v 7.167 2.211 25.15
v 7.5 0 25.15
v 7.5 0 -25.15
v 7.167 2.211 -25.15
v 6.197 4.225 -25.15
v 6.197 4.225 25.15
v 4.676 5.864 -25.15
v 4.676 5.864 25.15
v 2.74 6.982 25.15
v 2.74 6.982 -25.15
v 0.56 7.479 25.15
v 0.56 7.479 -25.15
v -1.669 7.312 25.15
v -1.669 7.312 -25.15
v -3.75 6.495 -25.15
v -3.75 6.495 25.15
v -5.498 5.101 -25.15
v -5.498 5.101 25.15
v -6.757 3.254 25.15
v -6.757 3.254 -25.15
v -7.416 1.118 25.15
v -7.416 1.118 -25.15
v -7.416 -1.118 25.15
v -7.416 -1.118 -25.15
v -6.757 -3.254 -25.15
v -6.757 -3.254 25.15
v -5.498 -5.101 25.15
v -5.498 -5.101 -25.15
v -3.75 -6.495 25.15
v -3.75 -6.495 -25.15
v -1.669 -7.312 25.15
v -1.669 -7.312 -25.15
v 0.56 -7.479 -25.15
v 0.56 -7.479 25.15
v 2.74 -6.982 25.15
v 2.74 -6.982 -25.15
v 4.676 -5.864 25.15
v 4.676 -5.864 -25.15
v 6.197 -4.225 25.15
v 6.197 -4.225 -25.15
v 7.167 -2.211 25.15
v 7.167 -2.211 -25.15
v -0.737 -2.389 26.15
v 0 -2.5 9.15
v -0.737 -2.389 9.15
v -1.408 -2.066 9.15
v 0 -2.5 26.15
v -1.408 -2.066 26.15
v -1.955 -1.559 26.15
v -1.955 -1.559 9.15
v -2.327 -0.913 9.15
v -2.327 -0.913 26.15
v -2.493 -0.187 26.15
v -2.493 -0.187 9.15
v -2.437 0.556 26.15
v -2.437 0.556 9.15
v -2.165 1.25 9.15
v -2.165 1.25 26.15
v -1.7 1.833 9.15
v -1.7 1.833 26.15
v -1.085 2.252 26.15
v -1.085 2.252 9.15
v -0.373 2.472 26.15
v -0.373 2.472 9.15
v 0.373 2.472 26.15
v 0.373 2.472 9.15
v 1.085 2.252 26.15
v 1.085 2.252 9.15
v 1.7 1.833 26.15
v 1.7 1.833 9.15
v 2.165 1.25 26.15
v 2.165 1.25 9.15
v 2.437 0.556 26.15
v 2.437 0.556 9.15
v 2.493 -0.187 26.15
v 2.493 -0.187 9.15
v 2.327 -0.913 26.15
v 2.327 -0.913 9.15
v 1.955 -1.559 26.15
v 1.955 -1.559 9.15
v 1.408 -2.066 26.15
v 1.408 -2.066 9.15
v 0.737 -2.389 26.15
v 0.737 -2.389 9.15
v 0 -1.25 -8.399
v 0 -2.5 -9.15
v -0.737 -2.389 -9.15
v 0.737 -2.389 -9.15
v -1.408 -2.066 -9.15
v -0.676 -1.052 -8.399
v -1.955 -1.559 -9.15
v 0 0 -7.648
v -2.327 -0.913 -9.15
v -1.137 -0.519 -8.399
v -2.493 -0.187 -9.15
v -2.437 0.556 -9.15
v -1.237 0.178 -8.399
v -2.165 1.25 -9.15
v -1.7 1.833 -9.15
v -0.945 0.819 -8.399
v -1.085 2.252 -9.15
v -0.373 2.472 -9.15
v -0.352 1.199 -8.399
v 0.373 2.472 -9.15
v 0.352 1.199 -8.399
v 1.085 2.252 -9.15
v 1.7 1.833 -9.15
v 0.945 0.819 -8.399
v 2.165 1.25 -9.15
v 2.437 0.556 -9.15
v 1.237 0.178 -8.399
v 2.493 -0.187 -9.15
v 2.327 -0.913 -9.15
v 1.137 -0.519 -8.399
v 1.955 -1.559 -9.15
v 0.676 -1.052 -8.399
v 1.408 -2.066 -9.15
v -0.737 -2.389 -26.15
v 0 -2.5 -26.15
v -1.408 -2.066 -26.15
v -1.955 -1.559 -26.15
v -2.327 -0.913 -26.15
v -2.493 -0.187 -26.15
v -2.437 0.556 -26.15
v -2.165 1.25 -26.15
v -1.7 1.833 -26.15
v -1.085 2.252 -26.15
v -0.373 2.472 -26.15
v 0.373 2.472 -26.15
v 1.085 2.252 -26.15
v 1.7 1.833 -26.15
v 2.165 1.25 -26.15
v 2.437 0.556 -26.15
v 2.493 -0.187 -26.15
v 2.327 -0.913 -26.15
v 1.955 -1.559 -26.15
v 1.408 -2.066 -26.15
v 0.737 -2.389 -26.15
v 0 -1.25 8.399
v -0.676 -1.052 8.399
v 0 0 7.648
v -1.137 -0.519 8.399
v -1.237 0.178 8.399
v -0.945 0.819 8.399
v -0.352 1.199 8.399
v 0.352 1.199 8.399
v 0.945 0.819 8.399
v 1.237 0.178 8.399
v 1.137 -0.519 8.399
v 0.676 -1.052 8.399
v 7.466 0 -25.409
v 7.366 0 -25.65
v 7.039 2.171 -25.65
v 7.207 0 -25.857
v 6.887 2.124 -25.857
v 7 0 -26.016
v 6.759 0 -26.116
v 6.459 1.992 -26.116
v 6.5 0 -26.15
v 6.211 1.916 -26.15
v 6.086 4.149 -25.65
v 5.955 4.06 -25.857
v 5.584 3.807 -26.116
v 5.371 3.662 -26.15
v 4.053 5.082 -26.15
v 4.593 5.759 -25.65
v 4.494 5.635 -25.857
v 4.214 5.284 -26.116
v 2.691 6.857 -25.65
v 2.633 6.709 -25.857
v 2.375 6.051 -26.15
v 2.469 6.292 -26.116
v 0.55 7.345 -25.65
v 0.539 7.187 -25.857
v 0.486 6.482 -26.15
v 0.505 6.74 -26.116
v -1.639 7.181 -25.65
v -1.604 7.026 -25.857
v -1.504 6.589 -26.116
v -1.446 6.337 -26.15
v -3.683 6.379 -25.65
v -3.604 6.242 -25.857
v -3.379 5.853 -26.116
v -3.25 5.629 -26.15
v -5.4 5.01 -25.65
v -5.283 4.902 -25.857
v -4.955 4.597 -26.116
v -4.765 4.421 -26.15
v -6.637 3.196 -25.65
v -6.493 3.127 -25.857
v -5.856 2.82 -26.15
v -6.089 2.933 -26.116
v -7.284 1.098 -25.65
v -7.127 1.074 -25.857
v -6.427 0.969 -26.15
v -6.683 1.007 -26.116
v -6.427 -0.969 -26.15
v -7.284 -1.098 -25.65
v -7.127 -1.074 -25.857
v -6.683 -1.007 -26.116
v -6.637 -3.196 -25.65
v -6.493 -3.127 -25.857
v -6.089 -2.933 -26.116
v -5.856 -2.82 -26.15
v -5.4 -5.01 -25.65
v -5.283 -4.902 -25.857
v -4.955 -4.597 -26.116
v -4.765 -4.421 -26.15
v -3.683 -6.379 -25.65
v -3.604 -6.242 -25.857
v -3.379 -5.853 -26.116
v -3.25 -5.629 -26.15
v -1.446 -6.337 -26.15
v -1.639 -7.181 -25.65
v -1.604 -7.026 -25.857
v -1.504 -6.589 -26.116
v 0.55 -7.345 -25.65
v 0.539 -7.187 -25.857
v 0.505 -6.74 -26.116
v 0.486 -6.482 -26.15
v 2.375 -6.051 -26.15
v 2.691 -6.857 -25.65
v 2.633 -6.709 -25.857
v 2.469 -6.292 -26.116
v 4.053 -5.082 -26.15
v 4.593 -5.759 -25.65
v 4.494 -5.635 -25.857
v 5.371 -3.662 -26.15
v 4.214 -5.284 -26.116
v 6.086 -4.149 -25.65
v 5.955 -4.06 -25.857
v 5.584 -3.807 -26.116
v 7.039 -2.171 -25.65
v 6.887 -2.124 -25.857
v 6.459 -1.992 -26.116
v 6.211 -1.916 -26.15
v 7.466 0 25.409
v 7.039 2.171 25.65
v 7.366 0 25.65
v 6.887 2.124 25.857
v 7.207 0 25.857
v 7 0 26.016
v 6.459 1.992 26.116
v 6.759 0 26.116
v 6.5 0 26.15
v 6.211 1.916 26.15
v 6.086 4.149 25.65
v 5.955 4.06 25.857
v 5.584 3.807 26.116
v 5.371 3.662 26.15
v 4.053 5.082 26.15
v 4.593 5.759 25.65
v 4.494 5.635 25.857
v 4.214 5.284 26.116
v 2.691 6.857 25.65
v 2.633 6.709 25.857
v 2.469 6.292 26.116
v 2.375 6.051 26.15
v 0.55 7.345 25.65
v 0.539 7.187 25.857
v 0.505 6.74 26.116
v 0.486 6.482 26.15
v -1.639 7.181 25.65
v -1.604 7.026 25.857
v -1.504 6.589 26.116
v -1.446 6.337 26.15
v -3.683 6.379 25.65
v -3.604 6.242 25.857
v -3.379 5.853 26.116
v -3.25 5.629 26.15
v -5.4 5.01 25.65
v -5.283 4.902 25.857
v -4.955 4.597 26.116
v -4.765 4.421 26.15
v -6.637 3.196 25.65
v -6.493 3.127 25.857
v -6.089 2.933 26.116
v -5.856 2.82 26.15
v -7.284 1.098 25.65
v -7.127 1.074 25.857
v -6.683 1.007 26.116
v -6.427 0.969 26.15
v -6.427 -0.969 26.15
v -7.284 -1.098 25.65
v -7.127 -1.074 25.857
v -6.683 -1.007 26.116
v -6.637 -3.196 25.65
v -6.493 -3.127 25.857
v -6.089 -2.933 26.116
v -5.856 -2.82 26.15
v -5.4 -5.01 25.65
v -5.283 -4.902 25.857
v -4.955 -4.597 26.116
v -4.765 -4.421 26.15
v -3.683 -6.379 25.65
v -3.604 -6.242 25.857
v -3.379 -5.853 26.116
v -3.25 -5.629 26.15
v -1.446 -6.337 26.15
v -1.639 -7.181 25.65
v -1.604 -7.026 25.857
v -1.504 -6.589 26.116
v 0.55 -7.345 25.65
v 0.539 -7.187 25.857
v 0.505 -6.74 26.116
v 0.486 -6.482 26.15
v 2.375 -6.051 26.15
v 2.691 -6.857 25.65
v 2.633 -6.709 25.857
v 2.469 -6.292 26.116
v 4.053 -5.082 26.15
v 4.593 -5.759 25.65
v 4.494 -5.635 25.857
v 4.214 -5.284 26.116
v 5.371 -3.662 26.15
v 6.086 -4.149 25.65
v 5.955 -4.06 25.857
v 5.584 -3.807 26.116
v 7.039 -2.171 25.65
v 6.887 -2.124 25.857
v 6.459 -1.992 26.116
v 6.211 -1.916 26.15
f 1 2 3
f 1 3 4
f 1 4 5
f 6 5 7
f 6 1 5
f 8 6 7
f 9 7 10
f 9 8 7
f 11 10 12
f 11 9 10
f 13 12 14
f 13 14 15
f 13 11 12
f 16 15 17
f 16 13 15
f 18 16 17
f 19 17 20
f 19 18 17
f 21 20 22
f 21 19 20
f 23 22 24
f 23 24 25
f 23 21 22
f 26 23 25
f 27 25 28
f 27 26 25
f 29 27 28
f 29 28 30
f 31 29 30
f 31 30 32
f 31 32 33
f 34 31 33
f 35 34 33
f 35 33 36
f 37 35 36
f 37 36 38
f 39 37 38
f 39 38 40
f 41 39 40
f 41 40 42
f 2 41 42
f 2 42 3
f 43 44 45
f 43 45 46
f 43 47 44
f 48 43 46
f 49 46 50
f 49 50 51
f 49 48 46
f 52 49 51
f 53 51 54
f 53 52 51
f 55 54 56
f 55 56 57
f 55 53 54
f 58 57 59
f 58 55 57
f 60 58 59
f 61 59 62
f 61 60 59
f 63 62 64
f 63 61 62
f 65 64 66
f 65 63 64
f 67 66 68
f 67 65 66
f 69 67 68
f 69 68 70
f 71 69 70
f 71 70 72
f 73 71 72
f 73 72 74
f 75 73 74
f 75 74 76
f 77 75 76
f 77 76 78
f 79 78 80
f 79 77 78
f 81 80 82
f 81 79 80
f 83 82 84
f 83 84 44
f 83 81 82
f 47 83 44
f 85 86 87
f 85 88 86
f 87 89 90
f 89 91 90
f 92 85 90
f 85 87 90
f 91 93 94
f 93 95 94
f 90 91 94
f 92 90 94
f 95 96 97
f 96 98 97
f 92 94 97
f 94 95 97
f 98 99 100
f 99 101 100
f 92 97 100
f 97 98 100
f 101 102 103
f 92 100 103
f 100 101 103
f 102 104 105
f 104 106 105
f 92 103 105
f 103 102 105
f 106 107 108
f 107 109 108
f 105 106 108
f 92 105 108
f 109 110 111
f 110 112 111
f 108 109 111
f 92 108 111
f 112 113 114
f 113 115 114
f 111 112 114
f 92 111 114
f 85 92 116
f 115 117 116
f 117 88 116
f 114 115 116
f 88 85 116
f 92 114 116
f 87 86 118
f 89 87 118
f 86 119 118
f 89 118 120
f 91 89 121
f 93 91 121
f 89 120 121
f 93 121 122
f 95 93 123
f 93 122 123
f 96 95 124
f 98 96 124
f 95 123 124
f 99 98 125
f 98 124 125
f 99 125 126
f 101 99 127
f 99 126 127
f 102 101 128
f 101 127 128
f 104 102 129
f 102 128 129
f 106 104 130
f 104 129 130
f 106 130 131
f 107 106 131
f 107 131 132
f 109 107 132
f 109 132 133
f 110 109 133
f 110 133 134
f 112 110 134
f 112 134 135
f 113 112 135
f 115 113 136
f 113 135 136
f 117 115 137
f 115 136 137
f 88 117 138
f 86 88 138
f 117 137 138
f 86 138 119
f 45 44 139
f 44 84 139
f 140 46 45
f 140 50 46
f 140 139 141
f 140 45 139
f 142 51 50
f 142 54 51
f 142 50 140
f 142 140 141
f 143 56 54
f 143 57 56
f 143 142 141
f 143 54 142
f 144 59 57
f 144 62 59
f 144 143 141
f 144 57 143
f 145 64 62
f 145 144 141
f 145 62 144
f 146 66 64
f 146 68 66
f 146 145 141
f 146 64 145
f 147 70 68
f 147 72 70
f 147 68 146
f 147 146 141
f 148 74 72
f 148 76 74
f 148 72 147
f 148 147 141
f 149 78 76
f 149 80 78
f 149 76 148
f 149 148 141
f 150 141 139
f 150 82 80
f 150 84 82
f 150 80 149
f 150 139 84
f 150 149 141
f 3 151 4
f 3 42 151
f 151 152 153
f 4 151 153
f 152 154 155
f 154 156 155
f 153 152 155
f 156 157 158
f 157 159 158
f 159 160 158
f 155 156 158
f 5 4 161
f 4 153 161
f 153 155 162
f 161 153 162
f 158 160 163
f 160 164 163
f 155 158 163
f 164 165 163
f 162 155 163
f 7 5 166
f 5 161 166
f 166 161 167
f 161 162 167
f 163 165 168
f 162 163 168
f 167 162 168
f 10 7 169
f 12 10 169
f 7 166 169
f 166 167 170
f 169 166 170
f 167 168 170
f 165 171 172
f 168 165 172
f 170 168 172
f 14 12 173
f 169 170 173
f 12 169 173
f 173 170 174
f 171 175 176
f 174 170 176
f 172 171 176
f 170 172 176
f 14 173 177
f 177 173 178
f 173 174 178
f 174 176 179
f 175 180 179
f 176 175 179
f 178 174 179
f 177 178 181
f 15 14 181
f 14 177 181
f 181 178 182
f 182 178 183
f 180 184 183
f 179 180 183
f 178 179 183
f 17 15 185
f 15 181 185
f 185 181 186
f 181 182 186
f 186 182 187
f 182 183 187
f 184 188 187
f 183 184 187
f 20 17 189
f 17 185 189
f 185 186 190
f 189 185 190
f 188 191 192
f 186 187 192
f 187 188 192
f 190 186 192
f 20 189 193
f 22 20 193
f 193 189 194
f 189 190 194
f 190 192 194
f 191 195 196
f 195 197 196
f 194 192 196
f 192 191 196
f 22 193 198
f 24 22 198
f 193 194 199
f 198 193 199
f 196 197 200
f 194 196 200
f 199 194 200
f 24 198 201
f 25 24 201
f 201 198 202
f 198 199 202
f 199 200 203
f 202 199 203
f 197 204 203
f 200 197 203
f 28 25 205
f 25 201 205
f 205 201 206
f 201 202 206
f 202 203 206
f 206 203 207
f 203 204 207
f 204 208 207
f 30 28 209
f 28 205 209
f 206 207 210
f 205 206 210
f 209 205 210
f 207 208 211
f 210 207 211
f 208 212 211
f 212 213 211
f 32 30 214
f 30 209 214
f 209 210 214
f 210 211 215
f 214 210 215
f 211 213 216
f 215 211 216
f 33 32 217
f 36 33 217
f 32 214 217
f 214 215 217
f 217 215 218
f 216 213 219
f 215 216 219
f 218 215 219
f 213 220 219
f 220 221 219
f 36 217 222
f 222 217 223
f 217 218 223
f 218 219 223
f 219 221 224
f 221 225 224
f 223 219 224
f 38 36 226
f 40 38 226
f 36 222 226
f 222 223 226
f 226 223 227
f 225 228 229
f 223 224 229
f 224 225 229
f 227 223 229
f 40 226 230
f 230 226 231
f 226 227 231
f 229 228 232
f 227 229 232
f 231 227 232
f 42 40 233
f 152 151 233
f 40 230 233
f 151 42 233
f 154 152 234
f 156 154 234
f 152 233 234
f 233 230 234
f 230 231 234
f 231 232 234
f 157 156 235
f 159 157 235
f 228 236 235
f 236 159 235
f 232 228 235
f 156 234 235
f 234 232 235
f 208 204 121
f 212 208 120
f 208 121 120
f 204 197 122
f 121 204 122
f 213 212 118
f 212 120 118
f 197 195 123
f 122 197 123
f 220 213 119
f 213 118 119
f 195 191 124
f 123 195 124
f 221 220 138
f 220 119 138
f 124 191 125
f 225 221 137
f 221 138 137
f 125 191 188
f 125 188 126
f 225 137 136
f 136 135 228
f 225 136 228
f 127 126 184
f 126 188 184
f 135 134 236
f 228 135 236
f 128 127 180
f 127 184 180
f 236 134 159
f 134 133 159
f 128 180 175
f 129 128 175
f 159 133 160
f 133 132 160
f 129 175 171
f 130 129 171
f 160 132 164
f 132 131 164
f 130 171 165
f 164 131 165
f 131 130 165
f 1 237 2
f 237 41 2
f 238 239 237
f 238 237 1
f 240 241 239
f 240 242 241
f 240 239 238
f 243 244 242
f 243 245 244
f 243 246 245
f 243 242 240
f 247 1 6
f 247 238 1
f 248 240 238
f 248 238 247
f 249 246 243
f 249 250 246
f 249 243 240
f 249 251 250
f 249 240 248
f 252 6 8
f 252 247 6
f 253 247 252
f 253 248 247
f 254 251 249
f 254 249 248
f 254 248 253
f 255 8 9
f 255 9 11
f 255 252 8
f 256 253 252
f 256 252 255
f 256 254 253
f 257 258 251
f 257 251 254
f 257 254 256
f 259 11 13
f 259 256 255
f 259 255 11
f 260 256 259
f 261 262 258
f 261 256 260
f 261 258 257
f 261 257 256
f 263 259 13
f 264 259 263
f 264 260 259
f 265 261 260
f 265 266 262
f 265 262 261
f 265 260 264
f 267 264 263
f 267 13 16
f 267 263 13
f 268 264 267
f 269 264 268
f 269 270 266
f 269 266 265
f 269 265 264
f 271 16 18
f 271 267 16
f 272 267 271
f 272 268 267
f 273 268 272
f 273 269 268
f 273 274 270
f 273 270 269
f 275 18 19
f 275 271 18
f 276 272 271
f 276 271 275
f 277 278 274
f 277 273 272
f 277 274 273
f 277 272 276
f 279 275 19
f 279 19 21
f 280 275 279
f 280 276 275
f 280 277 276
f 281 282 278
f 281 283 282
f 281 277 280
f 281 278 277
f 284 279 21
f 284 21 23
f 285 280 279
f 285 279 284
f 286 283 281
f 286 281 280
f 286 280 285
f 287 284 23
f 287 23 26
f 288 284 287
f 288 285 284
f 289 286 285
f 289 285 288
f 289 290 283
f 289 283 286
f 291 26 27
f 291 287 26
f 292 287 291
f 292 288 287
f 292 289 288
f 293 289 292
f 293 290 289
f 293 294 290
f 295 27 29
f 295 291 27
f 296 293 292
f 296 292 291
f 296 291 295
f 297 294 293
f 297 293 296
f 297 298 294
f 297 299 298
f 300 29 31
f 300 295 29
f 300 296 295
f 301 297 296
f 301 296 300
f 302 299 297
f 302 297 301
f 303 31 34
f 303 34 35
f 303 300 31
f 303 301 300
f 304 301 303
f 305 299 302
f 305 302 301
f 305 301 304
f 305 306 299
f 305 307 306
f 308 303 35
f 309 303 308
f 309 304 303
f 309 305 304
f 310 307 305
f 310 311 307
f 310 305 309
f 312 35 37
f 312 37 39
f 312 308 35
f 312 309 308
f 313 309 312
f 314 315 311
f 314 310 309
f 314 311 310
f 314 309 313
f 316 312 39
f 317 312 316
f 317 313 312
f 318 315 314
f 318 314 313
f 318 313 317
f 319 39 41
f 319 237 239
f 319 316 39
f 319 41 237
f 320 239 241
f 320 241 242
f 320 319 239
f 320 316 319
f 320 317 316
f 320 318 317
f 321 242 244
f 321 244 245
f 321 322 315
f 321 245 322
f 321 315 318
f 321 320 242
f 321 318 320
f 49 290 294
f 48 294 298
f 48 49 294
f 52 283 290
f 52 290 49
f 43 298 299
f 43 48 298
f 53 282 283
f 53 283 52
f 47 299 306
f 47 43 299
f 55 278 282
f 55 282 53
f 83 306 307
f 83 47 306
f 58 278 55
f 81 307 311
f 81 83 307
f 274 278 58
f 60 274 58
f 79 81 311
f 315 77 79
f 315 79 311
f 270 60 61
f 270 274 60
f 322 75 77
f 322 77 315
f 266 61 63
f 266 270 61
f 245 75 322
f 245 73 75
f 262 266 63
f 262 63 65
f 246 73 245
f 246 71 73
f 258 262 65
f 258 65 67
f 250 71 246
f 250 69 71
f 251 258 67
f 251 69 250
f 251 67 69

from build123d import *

# Parameters (mm, degrees)
CROQUIS1_R              = 7.5
SALIENTE_EXTRUIR1_DEPTH = 26.15
REDONDEO1_R             = 1


with BuildPart() as part:
    # Croquis1 → Saliente-Extruir1 (new, symmetric)
    with BuildSketch(Plane.XY):
        Circle(CROQUIS1_R)
    extrude(amount=SALIENTE_EXTRUIR1_DEPTH, both=True)

    # Croquis2 → Taladro roscado M61 (revolve, cut)
    with BuildSketch(Plane(origin=(0, 0, 26.15), x_dir=(0, -1, 0), z_dir=(1, 0, 0))):
        Polygon((0, 0), (0, 18.502151548), (2.5, 17), (2.5, 0), align=None)
    taladro_roscado_m61 = revolve(axis=Axis((0, 0, 32.5), (0, 0, -1)), mode=Mode.SUBTRACT)

    # Redondeo1
    redondeo1_edges = [part.edges().sort_by_distance(p)[0] for p in [
        (-7.5, 0, -26.15),
        (-7.5, 0, 26.15),
    ]]
    fillet(redondeo1_edges, radius=REDONDEO1_R)

    # Simetría1: Taladro roscado M61 across plane
    add(taladro_roscado_m61.mirror(Plane.XY), mode=Mode.SUBTRACT)


solid = part.part
